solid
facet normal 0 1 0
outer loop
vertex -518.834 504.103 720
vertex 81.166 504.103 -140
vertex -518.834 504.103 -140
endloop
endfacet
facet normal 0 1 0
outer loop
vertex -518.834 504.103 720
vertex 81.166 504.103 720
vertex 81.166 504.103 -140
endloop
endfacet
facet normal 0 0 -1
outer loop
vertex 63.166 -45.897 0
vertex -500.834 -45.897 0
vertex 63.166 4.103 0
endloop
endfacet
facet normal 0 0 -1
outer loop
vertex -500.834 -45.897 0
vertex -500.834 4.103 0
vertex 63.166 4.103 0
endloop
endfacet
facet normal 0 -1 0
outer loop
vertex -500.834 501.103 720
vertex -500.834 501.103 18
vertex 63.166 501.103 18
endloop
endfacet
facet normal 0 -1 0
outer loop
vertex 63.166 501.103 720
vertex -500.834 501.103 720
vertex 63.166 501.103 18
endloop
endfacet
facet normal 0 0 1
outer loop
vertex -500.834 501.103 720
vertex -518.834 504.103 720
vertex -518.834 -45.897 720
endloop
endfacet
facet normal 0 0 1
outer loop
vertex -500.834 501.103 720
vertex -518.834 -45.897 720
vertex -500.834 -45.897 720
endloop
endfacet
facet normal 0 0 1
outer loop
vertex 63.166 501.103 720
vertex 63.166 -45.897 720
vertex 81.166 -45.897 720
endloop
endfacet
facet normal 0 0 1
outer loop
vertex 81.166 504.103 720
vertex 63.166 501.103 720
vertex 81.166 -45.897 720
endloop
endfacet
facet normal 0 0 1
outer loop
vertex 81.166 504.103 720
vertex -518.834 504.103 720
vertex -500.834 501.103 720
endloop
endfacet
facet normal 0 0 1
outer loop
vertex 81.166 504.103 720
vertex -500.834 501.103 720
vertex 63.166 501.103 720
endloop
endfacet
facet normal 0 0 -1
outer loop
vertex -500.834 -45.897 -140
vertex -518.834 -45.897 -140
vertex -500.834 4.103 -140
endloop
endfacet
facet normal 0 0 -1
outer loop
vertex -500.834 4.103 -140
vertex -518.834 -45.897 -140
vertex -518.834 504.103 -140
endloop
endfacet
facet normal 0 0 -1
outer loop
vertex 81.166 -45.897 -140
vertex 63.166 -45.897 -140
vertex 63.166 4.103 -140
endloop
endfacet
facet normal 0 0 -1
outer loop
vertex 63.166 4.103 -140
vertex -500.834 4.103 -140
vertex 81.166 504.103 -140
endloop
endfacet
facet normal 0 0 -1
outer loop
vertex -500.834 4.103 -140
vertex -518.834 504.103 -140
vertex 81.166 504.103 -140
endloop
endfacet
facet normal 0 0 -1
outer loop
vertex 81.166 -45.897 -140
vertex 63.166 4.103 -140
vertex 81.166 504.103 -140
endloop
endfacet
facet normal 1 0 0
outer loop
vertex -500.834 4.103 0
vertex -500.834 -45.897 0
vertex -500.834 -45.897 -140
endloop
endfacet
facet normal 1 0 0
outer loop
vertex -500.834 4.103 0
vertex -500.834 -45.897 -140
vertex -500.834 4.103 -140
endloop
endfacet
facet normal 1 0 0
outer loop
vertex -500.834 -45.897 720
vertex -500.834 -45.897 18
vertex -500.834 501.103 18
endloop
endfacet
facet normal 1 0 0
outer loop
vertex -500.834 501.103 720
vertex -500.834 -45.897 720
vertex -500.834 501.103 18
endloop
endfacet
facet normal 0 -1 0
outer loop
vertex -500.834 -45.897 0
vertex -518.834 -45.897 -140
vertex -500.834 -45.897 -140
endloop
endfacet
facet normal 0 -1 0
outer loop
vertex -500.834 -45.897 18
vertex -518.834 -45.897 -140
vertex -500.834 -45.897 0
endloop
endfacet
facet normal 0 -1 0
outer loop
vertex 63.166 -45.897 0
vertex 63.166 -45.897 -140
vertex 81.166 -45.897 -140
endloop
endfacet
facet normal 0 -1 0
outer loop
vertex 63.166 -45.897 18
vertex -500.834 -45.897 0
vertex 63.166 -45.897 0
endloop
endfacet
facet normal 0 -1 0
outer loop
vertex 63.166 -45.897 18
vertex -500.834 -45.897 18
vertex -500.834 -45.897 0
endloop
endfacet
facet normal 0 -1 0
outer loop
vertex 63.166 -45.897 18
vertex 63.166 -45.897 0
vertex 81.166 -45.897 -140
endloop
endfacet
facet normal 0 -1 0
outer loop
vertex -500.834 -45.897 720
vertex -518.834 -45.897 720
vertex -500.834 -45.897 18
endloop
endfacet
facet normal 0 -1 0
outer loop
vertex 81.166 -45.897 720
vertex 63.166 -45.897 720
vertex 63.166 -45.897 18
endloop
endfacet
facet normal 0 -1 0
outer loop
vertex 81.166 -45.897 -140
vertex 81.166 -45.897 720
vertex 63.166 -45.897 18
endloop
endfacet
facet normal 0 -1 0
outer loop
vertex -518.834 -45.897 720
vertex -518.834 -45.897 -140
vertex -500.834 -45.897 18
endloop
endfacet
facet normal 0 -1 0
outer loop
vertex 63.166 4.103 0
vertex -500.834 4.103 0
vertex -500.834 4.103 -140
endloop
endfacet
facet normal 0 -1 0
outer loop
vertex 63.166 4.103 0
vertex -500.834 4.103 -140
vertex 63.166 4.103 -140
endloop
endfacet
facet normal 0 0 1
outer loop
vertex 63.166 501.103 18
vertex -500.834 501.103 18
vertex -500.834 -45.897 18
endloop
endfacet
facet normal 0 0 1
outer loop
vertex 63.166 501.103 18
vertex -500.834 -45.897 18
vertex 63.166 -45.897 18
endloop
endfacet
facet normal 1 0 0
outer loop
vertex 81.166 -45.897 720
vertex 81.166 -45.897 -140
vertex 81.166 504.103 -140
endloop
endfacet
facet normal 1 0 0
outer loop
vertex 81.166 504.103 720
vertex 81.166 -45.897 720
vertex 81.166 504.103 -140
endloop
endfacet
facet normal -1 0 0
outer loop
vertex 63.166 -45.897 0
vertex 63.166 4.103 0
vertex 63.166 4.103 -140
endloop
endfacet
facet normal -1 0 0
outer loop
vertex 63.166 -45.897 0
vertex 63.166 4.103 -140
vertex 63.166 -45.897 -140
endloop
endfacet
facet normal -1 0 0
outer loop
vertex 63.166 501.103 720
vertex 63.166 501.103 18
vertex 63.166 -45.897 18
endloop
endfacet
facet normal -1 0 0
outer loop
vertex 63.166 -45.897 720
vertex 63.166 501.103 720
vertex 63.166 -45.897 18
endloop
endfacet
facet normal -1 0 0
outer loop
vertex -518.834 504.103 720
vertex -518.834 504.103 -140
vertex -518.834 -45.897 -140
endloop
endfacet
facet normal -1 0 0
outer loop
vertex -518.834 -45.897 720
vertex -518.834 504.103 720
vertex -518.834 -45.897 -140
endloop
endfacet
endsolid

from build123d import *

# Parameters (mm, degrees)
F2_DEPTH = 720
F1_W     = 600
F1_H     = 550
F3_DEPTH = 18
F5_DEPTH = 140


with BuildPart() as f2:
    # F0 (on Top) → F2 (new body)
    with BuildSketch(Plane.XY):
        Polygon((81.165642, 504.102758), (-518.834358, 504.102758), (-518.834358, -45.897242), (-500.834358, -45.897242), (-500.834358, 501.102758), (63.165642, 501.102758), (63.165642, -45.897242), (81.165642, -45.897242), align=None)
    extrude(amount=F2_DEPTH)

    # F1 (on Top) → F3 (join)
    with BuildSketch(Plane.XY):
        with Locations((-218.834358, 229.102758)):
            Rectangle(F1_W, F1_H)
    extrude(amount=F3_DEPTH)

    # F4 (on Top) → F5 (join)
    with BuildSketch(Plane.XY):
        Polygon((81.165642, 504.102758), (-518.834358, 504.102758), (-518.834358, -45.897242), (-500.834358, -45.897242), (-500.834358, 4.102758), (63.165642, 4.102758), (63.165642, -45.897242), (81.165642, -45.897242), align=None)
    extrude(amount=-F5_DEPTH)


solid = f2.part
